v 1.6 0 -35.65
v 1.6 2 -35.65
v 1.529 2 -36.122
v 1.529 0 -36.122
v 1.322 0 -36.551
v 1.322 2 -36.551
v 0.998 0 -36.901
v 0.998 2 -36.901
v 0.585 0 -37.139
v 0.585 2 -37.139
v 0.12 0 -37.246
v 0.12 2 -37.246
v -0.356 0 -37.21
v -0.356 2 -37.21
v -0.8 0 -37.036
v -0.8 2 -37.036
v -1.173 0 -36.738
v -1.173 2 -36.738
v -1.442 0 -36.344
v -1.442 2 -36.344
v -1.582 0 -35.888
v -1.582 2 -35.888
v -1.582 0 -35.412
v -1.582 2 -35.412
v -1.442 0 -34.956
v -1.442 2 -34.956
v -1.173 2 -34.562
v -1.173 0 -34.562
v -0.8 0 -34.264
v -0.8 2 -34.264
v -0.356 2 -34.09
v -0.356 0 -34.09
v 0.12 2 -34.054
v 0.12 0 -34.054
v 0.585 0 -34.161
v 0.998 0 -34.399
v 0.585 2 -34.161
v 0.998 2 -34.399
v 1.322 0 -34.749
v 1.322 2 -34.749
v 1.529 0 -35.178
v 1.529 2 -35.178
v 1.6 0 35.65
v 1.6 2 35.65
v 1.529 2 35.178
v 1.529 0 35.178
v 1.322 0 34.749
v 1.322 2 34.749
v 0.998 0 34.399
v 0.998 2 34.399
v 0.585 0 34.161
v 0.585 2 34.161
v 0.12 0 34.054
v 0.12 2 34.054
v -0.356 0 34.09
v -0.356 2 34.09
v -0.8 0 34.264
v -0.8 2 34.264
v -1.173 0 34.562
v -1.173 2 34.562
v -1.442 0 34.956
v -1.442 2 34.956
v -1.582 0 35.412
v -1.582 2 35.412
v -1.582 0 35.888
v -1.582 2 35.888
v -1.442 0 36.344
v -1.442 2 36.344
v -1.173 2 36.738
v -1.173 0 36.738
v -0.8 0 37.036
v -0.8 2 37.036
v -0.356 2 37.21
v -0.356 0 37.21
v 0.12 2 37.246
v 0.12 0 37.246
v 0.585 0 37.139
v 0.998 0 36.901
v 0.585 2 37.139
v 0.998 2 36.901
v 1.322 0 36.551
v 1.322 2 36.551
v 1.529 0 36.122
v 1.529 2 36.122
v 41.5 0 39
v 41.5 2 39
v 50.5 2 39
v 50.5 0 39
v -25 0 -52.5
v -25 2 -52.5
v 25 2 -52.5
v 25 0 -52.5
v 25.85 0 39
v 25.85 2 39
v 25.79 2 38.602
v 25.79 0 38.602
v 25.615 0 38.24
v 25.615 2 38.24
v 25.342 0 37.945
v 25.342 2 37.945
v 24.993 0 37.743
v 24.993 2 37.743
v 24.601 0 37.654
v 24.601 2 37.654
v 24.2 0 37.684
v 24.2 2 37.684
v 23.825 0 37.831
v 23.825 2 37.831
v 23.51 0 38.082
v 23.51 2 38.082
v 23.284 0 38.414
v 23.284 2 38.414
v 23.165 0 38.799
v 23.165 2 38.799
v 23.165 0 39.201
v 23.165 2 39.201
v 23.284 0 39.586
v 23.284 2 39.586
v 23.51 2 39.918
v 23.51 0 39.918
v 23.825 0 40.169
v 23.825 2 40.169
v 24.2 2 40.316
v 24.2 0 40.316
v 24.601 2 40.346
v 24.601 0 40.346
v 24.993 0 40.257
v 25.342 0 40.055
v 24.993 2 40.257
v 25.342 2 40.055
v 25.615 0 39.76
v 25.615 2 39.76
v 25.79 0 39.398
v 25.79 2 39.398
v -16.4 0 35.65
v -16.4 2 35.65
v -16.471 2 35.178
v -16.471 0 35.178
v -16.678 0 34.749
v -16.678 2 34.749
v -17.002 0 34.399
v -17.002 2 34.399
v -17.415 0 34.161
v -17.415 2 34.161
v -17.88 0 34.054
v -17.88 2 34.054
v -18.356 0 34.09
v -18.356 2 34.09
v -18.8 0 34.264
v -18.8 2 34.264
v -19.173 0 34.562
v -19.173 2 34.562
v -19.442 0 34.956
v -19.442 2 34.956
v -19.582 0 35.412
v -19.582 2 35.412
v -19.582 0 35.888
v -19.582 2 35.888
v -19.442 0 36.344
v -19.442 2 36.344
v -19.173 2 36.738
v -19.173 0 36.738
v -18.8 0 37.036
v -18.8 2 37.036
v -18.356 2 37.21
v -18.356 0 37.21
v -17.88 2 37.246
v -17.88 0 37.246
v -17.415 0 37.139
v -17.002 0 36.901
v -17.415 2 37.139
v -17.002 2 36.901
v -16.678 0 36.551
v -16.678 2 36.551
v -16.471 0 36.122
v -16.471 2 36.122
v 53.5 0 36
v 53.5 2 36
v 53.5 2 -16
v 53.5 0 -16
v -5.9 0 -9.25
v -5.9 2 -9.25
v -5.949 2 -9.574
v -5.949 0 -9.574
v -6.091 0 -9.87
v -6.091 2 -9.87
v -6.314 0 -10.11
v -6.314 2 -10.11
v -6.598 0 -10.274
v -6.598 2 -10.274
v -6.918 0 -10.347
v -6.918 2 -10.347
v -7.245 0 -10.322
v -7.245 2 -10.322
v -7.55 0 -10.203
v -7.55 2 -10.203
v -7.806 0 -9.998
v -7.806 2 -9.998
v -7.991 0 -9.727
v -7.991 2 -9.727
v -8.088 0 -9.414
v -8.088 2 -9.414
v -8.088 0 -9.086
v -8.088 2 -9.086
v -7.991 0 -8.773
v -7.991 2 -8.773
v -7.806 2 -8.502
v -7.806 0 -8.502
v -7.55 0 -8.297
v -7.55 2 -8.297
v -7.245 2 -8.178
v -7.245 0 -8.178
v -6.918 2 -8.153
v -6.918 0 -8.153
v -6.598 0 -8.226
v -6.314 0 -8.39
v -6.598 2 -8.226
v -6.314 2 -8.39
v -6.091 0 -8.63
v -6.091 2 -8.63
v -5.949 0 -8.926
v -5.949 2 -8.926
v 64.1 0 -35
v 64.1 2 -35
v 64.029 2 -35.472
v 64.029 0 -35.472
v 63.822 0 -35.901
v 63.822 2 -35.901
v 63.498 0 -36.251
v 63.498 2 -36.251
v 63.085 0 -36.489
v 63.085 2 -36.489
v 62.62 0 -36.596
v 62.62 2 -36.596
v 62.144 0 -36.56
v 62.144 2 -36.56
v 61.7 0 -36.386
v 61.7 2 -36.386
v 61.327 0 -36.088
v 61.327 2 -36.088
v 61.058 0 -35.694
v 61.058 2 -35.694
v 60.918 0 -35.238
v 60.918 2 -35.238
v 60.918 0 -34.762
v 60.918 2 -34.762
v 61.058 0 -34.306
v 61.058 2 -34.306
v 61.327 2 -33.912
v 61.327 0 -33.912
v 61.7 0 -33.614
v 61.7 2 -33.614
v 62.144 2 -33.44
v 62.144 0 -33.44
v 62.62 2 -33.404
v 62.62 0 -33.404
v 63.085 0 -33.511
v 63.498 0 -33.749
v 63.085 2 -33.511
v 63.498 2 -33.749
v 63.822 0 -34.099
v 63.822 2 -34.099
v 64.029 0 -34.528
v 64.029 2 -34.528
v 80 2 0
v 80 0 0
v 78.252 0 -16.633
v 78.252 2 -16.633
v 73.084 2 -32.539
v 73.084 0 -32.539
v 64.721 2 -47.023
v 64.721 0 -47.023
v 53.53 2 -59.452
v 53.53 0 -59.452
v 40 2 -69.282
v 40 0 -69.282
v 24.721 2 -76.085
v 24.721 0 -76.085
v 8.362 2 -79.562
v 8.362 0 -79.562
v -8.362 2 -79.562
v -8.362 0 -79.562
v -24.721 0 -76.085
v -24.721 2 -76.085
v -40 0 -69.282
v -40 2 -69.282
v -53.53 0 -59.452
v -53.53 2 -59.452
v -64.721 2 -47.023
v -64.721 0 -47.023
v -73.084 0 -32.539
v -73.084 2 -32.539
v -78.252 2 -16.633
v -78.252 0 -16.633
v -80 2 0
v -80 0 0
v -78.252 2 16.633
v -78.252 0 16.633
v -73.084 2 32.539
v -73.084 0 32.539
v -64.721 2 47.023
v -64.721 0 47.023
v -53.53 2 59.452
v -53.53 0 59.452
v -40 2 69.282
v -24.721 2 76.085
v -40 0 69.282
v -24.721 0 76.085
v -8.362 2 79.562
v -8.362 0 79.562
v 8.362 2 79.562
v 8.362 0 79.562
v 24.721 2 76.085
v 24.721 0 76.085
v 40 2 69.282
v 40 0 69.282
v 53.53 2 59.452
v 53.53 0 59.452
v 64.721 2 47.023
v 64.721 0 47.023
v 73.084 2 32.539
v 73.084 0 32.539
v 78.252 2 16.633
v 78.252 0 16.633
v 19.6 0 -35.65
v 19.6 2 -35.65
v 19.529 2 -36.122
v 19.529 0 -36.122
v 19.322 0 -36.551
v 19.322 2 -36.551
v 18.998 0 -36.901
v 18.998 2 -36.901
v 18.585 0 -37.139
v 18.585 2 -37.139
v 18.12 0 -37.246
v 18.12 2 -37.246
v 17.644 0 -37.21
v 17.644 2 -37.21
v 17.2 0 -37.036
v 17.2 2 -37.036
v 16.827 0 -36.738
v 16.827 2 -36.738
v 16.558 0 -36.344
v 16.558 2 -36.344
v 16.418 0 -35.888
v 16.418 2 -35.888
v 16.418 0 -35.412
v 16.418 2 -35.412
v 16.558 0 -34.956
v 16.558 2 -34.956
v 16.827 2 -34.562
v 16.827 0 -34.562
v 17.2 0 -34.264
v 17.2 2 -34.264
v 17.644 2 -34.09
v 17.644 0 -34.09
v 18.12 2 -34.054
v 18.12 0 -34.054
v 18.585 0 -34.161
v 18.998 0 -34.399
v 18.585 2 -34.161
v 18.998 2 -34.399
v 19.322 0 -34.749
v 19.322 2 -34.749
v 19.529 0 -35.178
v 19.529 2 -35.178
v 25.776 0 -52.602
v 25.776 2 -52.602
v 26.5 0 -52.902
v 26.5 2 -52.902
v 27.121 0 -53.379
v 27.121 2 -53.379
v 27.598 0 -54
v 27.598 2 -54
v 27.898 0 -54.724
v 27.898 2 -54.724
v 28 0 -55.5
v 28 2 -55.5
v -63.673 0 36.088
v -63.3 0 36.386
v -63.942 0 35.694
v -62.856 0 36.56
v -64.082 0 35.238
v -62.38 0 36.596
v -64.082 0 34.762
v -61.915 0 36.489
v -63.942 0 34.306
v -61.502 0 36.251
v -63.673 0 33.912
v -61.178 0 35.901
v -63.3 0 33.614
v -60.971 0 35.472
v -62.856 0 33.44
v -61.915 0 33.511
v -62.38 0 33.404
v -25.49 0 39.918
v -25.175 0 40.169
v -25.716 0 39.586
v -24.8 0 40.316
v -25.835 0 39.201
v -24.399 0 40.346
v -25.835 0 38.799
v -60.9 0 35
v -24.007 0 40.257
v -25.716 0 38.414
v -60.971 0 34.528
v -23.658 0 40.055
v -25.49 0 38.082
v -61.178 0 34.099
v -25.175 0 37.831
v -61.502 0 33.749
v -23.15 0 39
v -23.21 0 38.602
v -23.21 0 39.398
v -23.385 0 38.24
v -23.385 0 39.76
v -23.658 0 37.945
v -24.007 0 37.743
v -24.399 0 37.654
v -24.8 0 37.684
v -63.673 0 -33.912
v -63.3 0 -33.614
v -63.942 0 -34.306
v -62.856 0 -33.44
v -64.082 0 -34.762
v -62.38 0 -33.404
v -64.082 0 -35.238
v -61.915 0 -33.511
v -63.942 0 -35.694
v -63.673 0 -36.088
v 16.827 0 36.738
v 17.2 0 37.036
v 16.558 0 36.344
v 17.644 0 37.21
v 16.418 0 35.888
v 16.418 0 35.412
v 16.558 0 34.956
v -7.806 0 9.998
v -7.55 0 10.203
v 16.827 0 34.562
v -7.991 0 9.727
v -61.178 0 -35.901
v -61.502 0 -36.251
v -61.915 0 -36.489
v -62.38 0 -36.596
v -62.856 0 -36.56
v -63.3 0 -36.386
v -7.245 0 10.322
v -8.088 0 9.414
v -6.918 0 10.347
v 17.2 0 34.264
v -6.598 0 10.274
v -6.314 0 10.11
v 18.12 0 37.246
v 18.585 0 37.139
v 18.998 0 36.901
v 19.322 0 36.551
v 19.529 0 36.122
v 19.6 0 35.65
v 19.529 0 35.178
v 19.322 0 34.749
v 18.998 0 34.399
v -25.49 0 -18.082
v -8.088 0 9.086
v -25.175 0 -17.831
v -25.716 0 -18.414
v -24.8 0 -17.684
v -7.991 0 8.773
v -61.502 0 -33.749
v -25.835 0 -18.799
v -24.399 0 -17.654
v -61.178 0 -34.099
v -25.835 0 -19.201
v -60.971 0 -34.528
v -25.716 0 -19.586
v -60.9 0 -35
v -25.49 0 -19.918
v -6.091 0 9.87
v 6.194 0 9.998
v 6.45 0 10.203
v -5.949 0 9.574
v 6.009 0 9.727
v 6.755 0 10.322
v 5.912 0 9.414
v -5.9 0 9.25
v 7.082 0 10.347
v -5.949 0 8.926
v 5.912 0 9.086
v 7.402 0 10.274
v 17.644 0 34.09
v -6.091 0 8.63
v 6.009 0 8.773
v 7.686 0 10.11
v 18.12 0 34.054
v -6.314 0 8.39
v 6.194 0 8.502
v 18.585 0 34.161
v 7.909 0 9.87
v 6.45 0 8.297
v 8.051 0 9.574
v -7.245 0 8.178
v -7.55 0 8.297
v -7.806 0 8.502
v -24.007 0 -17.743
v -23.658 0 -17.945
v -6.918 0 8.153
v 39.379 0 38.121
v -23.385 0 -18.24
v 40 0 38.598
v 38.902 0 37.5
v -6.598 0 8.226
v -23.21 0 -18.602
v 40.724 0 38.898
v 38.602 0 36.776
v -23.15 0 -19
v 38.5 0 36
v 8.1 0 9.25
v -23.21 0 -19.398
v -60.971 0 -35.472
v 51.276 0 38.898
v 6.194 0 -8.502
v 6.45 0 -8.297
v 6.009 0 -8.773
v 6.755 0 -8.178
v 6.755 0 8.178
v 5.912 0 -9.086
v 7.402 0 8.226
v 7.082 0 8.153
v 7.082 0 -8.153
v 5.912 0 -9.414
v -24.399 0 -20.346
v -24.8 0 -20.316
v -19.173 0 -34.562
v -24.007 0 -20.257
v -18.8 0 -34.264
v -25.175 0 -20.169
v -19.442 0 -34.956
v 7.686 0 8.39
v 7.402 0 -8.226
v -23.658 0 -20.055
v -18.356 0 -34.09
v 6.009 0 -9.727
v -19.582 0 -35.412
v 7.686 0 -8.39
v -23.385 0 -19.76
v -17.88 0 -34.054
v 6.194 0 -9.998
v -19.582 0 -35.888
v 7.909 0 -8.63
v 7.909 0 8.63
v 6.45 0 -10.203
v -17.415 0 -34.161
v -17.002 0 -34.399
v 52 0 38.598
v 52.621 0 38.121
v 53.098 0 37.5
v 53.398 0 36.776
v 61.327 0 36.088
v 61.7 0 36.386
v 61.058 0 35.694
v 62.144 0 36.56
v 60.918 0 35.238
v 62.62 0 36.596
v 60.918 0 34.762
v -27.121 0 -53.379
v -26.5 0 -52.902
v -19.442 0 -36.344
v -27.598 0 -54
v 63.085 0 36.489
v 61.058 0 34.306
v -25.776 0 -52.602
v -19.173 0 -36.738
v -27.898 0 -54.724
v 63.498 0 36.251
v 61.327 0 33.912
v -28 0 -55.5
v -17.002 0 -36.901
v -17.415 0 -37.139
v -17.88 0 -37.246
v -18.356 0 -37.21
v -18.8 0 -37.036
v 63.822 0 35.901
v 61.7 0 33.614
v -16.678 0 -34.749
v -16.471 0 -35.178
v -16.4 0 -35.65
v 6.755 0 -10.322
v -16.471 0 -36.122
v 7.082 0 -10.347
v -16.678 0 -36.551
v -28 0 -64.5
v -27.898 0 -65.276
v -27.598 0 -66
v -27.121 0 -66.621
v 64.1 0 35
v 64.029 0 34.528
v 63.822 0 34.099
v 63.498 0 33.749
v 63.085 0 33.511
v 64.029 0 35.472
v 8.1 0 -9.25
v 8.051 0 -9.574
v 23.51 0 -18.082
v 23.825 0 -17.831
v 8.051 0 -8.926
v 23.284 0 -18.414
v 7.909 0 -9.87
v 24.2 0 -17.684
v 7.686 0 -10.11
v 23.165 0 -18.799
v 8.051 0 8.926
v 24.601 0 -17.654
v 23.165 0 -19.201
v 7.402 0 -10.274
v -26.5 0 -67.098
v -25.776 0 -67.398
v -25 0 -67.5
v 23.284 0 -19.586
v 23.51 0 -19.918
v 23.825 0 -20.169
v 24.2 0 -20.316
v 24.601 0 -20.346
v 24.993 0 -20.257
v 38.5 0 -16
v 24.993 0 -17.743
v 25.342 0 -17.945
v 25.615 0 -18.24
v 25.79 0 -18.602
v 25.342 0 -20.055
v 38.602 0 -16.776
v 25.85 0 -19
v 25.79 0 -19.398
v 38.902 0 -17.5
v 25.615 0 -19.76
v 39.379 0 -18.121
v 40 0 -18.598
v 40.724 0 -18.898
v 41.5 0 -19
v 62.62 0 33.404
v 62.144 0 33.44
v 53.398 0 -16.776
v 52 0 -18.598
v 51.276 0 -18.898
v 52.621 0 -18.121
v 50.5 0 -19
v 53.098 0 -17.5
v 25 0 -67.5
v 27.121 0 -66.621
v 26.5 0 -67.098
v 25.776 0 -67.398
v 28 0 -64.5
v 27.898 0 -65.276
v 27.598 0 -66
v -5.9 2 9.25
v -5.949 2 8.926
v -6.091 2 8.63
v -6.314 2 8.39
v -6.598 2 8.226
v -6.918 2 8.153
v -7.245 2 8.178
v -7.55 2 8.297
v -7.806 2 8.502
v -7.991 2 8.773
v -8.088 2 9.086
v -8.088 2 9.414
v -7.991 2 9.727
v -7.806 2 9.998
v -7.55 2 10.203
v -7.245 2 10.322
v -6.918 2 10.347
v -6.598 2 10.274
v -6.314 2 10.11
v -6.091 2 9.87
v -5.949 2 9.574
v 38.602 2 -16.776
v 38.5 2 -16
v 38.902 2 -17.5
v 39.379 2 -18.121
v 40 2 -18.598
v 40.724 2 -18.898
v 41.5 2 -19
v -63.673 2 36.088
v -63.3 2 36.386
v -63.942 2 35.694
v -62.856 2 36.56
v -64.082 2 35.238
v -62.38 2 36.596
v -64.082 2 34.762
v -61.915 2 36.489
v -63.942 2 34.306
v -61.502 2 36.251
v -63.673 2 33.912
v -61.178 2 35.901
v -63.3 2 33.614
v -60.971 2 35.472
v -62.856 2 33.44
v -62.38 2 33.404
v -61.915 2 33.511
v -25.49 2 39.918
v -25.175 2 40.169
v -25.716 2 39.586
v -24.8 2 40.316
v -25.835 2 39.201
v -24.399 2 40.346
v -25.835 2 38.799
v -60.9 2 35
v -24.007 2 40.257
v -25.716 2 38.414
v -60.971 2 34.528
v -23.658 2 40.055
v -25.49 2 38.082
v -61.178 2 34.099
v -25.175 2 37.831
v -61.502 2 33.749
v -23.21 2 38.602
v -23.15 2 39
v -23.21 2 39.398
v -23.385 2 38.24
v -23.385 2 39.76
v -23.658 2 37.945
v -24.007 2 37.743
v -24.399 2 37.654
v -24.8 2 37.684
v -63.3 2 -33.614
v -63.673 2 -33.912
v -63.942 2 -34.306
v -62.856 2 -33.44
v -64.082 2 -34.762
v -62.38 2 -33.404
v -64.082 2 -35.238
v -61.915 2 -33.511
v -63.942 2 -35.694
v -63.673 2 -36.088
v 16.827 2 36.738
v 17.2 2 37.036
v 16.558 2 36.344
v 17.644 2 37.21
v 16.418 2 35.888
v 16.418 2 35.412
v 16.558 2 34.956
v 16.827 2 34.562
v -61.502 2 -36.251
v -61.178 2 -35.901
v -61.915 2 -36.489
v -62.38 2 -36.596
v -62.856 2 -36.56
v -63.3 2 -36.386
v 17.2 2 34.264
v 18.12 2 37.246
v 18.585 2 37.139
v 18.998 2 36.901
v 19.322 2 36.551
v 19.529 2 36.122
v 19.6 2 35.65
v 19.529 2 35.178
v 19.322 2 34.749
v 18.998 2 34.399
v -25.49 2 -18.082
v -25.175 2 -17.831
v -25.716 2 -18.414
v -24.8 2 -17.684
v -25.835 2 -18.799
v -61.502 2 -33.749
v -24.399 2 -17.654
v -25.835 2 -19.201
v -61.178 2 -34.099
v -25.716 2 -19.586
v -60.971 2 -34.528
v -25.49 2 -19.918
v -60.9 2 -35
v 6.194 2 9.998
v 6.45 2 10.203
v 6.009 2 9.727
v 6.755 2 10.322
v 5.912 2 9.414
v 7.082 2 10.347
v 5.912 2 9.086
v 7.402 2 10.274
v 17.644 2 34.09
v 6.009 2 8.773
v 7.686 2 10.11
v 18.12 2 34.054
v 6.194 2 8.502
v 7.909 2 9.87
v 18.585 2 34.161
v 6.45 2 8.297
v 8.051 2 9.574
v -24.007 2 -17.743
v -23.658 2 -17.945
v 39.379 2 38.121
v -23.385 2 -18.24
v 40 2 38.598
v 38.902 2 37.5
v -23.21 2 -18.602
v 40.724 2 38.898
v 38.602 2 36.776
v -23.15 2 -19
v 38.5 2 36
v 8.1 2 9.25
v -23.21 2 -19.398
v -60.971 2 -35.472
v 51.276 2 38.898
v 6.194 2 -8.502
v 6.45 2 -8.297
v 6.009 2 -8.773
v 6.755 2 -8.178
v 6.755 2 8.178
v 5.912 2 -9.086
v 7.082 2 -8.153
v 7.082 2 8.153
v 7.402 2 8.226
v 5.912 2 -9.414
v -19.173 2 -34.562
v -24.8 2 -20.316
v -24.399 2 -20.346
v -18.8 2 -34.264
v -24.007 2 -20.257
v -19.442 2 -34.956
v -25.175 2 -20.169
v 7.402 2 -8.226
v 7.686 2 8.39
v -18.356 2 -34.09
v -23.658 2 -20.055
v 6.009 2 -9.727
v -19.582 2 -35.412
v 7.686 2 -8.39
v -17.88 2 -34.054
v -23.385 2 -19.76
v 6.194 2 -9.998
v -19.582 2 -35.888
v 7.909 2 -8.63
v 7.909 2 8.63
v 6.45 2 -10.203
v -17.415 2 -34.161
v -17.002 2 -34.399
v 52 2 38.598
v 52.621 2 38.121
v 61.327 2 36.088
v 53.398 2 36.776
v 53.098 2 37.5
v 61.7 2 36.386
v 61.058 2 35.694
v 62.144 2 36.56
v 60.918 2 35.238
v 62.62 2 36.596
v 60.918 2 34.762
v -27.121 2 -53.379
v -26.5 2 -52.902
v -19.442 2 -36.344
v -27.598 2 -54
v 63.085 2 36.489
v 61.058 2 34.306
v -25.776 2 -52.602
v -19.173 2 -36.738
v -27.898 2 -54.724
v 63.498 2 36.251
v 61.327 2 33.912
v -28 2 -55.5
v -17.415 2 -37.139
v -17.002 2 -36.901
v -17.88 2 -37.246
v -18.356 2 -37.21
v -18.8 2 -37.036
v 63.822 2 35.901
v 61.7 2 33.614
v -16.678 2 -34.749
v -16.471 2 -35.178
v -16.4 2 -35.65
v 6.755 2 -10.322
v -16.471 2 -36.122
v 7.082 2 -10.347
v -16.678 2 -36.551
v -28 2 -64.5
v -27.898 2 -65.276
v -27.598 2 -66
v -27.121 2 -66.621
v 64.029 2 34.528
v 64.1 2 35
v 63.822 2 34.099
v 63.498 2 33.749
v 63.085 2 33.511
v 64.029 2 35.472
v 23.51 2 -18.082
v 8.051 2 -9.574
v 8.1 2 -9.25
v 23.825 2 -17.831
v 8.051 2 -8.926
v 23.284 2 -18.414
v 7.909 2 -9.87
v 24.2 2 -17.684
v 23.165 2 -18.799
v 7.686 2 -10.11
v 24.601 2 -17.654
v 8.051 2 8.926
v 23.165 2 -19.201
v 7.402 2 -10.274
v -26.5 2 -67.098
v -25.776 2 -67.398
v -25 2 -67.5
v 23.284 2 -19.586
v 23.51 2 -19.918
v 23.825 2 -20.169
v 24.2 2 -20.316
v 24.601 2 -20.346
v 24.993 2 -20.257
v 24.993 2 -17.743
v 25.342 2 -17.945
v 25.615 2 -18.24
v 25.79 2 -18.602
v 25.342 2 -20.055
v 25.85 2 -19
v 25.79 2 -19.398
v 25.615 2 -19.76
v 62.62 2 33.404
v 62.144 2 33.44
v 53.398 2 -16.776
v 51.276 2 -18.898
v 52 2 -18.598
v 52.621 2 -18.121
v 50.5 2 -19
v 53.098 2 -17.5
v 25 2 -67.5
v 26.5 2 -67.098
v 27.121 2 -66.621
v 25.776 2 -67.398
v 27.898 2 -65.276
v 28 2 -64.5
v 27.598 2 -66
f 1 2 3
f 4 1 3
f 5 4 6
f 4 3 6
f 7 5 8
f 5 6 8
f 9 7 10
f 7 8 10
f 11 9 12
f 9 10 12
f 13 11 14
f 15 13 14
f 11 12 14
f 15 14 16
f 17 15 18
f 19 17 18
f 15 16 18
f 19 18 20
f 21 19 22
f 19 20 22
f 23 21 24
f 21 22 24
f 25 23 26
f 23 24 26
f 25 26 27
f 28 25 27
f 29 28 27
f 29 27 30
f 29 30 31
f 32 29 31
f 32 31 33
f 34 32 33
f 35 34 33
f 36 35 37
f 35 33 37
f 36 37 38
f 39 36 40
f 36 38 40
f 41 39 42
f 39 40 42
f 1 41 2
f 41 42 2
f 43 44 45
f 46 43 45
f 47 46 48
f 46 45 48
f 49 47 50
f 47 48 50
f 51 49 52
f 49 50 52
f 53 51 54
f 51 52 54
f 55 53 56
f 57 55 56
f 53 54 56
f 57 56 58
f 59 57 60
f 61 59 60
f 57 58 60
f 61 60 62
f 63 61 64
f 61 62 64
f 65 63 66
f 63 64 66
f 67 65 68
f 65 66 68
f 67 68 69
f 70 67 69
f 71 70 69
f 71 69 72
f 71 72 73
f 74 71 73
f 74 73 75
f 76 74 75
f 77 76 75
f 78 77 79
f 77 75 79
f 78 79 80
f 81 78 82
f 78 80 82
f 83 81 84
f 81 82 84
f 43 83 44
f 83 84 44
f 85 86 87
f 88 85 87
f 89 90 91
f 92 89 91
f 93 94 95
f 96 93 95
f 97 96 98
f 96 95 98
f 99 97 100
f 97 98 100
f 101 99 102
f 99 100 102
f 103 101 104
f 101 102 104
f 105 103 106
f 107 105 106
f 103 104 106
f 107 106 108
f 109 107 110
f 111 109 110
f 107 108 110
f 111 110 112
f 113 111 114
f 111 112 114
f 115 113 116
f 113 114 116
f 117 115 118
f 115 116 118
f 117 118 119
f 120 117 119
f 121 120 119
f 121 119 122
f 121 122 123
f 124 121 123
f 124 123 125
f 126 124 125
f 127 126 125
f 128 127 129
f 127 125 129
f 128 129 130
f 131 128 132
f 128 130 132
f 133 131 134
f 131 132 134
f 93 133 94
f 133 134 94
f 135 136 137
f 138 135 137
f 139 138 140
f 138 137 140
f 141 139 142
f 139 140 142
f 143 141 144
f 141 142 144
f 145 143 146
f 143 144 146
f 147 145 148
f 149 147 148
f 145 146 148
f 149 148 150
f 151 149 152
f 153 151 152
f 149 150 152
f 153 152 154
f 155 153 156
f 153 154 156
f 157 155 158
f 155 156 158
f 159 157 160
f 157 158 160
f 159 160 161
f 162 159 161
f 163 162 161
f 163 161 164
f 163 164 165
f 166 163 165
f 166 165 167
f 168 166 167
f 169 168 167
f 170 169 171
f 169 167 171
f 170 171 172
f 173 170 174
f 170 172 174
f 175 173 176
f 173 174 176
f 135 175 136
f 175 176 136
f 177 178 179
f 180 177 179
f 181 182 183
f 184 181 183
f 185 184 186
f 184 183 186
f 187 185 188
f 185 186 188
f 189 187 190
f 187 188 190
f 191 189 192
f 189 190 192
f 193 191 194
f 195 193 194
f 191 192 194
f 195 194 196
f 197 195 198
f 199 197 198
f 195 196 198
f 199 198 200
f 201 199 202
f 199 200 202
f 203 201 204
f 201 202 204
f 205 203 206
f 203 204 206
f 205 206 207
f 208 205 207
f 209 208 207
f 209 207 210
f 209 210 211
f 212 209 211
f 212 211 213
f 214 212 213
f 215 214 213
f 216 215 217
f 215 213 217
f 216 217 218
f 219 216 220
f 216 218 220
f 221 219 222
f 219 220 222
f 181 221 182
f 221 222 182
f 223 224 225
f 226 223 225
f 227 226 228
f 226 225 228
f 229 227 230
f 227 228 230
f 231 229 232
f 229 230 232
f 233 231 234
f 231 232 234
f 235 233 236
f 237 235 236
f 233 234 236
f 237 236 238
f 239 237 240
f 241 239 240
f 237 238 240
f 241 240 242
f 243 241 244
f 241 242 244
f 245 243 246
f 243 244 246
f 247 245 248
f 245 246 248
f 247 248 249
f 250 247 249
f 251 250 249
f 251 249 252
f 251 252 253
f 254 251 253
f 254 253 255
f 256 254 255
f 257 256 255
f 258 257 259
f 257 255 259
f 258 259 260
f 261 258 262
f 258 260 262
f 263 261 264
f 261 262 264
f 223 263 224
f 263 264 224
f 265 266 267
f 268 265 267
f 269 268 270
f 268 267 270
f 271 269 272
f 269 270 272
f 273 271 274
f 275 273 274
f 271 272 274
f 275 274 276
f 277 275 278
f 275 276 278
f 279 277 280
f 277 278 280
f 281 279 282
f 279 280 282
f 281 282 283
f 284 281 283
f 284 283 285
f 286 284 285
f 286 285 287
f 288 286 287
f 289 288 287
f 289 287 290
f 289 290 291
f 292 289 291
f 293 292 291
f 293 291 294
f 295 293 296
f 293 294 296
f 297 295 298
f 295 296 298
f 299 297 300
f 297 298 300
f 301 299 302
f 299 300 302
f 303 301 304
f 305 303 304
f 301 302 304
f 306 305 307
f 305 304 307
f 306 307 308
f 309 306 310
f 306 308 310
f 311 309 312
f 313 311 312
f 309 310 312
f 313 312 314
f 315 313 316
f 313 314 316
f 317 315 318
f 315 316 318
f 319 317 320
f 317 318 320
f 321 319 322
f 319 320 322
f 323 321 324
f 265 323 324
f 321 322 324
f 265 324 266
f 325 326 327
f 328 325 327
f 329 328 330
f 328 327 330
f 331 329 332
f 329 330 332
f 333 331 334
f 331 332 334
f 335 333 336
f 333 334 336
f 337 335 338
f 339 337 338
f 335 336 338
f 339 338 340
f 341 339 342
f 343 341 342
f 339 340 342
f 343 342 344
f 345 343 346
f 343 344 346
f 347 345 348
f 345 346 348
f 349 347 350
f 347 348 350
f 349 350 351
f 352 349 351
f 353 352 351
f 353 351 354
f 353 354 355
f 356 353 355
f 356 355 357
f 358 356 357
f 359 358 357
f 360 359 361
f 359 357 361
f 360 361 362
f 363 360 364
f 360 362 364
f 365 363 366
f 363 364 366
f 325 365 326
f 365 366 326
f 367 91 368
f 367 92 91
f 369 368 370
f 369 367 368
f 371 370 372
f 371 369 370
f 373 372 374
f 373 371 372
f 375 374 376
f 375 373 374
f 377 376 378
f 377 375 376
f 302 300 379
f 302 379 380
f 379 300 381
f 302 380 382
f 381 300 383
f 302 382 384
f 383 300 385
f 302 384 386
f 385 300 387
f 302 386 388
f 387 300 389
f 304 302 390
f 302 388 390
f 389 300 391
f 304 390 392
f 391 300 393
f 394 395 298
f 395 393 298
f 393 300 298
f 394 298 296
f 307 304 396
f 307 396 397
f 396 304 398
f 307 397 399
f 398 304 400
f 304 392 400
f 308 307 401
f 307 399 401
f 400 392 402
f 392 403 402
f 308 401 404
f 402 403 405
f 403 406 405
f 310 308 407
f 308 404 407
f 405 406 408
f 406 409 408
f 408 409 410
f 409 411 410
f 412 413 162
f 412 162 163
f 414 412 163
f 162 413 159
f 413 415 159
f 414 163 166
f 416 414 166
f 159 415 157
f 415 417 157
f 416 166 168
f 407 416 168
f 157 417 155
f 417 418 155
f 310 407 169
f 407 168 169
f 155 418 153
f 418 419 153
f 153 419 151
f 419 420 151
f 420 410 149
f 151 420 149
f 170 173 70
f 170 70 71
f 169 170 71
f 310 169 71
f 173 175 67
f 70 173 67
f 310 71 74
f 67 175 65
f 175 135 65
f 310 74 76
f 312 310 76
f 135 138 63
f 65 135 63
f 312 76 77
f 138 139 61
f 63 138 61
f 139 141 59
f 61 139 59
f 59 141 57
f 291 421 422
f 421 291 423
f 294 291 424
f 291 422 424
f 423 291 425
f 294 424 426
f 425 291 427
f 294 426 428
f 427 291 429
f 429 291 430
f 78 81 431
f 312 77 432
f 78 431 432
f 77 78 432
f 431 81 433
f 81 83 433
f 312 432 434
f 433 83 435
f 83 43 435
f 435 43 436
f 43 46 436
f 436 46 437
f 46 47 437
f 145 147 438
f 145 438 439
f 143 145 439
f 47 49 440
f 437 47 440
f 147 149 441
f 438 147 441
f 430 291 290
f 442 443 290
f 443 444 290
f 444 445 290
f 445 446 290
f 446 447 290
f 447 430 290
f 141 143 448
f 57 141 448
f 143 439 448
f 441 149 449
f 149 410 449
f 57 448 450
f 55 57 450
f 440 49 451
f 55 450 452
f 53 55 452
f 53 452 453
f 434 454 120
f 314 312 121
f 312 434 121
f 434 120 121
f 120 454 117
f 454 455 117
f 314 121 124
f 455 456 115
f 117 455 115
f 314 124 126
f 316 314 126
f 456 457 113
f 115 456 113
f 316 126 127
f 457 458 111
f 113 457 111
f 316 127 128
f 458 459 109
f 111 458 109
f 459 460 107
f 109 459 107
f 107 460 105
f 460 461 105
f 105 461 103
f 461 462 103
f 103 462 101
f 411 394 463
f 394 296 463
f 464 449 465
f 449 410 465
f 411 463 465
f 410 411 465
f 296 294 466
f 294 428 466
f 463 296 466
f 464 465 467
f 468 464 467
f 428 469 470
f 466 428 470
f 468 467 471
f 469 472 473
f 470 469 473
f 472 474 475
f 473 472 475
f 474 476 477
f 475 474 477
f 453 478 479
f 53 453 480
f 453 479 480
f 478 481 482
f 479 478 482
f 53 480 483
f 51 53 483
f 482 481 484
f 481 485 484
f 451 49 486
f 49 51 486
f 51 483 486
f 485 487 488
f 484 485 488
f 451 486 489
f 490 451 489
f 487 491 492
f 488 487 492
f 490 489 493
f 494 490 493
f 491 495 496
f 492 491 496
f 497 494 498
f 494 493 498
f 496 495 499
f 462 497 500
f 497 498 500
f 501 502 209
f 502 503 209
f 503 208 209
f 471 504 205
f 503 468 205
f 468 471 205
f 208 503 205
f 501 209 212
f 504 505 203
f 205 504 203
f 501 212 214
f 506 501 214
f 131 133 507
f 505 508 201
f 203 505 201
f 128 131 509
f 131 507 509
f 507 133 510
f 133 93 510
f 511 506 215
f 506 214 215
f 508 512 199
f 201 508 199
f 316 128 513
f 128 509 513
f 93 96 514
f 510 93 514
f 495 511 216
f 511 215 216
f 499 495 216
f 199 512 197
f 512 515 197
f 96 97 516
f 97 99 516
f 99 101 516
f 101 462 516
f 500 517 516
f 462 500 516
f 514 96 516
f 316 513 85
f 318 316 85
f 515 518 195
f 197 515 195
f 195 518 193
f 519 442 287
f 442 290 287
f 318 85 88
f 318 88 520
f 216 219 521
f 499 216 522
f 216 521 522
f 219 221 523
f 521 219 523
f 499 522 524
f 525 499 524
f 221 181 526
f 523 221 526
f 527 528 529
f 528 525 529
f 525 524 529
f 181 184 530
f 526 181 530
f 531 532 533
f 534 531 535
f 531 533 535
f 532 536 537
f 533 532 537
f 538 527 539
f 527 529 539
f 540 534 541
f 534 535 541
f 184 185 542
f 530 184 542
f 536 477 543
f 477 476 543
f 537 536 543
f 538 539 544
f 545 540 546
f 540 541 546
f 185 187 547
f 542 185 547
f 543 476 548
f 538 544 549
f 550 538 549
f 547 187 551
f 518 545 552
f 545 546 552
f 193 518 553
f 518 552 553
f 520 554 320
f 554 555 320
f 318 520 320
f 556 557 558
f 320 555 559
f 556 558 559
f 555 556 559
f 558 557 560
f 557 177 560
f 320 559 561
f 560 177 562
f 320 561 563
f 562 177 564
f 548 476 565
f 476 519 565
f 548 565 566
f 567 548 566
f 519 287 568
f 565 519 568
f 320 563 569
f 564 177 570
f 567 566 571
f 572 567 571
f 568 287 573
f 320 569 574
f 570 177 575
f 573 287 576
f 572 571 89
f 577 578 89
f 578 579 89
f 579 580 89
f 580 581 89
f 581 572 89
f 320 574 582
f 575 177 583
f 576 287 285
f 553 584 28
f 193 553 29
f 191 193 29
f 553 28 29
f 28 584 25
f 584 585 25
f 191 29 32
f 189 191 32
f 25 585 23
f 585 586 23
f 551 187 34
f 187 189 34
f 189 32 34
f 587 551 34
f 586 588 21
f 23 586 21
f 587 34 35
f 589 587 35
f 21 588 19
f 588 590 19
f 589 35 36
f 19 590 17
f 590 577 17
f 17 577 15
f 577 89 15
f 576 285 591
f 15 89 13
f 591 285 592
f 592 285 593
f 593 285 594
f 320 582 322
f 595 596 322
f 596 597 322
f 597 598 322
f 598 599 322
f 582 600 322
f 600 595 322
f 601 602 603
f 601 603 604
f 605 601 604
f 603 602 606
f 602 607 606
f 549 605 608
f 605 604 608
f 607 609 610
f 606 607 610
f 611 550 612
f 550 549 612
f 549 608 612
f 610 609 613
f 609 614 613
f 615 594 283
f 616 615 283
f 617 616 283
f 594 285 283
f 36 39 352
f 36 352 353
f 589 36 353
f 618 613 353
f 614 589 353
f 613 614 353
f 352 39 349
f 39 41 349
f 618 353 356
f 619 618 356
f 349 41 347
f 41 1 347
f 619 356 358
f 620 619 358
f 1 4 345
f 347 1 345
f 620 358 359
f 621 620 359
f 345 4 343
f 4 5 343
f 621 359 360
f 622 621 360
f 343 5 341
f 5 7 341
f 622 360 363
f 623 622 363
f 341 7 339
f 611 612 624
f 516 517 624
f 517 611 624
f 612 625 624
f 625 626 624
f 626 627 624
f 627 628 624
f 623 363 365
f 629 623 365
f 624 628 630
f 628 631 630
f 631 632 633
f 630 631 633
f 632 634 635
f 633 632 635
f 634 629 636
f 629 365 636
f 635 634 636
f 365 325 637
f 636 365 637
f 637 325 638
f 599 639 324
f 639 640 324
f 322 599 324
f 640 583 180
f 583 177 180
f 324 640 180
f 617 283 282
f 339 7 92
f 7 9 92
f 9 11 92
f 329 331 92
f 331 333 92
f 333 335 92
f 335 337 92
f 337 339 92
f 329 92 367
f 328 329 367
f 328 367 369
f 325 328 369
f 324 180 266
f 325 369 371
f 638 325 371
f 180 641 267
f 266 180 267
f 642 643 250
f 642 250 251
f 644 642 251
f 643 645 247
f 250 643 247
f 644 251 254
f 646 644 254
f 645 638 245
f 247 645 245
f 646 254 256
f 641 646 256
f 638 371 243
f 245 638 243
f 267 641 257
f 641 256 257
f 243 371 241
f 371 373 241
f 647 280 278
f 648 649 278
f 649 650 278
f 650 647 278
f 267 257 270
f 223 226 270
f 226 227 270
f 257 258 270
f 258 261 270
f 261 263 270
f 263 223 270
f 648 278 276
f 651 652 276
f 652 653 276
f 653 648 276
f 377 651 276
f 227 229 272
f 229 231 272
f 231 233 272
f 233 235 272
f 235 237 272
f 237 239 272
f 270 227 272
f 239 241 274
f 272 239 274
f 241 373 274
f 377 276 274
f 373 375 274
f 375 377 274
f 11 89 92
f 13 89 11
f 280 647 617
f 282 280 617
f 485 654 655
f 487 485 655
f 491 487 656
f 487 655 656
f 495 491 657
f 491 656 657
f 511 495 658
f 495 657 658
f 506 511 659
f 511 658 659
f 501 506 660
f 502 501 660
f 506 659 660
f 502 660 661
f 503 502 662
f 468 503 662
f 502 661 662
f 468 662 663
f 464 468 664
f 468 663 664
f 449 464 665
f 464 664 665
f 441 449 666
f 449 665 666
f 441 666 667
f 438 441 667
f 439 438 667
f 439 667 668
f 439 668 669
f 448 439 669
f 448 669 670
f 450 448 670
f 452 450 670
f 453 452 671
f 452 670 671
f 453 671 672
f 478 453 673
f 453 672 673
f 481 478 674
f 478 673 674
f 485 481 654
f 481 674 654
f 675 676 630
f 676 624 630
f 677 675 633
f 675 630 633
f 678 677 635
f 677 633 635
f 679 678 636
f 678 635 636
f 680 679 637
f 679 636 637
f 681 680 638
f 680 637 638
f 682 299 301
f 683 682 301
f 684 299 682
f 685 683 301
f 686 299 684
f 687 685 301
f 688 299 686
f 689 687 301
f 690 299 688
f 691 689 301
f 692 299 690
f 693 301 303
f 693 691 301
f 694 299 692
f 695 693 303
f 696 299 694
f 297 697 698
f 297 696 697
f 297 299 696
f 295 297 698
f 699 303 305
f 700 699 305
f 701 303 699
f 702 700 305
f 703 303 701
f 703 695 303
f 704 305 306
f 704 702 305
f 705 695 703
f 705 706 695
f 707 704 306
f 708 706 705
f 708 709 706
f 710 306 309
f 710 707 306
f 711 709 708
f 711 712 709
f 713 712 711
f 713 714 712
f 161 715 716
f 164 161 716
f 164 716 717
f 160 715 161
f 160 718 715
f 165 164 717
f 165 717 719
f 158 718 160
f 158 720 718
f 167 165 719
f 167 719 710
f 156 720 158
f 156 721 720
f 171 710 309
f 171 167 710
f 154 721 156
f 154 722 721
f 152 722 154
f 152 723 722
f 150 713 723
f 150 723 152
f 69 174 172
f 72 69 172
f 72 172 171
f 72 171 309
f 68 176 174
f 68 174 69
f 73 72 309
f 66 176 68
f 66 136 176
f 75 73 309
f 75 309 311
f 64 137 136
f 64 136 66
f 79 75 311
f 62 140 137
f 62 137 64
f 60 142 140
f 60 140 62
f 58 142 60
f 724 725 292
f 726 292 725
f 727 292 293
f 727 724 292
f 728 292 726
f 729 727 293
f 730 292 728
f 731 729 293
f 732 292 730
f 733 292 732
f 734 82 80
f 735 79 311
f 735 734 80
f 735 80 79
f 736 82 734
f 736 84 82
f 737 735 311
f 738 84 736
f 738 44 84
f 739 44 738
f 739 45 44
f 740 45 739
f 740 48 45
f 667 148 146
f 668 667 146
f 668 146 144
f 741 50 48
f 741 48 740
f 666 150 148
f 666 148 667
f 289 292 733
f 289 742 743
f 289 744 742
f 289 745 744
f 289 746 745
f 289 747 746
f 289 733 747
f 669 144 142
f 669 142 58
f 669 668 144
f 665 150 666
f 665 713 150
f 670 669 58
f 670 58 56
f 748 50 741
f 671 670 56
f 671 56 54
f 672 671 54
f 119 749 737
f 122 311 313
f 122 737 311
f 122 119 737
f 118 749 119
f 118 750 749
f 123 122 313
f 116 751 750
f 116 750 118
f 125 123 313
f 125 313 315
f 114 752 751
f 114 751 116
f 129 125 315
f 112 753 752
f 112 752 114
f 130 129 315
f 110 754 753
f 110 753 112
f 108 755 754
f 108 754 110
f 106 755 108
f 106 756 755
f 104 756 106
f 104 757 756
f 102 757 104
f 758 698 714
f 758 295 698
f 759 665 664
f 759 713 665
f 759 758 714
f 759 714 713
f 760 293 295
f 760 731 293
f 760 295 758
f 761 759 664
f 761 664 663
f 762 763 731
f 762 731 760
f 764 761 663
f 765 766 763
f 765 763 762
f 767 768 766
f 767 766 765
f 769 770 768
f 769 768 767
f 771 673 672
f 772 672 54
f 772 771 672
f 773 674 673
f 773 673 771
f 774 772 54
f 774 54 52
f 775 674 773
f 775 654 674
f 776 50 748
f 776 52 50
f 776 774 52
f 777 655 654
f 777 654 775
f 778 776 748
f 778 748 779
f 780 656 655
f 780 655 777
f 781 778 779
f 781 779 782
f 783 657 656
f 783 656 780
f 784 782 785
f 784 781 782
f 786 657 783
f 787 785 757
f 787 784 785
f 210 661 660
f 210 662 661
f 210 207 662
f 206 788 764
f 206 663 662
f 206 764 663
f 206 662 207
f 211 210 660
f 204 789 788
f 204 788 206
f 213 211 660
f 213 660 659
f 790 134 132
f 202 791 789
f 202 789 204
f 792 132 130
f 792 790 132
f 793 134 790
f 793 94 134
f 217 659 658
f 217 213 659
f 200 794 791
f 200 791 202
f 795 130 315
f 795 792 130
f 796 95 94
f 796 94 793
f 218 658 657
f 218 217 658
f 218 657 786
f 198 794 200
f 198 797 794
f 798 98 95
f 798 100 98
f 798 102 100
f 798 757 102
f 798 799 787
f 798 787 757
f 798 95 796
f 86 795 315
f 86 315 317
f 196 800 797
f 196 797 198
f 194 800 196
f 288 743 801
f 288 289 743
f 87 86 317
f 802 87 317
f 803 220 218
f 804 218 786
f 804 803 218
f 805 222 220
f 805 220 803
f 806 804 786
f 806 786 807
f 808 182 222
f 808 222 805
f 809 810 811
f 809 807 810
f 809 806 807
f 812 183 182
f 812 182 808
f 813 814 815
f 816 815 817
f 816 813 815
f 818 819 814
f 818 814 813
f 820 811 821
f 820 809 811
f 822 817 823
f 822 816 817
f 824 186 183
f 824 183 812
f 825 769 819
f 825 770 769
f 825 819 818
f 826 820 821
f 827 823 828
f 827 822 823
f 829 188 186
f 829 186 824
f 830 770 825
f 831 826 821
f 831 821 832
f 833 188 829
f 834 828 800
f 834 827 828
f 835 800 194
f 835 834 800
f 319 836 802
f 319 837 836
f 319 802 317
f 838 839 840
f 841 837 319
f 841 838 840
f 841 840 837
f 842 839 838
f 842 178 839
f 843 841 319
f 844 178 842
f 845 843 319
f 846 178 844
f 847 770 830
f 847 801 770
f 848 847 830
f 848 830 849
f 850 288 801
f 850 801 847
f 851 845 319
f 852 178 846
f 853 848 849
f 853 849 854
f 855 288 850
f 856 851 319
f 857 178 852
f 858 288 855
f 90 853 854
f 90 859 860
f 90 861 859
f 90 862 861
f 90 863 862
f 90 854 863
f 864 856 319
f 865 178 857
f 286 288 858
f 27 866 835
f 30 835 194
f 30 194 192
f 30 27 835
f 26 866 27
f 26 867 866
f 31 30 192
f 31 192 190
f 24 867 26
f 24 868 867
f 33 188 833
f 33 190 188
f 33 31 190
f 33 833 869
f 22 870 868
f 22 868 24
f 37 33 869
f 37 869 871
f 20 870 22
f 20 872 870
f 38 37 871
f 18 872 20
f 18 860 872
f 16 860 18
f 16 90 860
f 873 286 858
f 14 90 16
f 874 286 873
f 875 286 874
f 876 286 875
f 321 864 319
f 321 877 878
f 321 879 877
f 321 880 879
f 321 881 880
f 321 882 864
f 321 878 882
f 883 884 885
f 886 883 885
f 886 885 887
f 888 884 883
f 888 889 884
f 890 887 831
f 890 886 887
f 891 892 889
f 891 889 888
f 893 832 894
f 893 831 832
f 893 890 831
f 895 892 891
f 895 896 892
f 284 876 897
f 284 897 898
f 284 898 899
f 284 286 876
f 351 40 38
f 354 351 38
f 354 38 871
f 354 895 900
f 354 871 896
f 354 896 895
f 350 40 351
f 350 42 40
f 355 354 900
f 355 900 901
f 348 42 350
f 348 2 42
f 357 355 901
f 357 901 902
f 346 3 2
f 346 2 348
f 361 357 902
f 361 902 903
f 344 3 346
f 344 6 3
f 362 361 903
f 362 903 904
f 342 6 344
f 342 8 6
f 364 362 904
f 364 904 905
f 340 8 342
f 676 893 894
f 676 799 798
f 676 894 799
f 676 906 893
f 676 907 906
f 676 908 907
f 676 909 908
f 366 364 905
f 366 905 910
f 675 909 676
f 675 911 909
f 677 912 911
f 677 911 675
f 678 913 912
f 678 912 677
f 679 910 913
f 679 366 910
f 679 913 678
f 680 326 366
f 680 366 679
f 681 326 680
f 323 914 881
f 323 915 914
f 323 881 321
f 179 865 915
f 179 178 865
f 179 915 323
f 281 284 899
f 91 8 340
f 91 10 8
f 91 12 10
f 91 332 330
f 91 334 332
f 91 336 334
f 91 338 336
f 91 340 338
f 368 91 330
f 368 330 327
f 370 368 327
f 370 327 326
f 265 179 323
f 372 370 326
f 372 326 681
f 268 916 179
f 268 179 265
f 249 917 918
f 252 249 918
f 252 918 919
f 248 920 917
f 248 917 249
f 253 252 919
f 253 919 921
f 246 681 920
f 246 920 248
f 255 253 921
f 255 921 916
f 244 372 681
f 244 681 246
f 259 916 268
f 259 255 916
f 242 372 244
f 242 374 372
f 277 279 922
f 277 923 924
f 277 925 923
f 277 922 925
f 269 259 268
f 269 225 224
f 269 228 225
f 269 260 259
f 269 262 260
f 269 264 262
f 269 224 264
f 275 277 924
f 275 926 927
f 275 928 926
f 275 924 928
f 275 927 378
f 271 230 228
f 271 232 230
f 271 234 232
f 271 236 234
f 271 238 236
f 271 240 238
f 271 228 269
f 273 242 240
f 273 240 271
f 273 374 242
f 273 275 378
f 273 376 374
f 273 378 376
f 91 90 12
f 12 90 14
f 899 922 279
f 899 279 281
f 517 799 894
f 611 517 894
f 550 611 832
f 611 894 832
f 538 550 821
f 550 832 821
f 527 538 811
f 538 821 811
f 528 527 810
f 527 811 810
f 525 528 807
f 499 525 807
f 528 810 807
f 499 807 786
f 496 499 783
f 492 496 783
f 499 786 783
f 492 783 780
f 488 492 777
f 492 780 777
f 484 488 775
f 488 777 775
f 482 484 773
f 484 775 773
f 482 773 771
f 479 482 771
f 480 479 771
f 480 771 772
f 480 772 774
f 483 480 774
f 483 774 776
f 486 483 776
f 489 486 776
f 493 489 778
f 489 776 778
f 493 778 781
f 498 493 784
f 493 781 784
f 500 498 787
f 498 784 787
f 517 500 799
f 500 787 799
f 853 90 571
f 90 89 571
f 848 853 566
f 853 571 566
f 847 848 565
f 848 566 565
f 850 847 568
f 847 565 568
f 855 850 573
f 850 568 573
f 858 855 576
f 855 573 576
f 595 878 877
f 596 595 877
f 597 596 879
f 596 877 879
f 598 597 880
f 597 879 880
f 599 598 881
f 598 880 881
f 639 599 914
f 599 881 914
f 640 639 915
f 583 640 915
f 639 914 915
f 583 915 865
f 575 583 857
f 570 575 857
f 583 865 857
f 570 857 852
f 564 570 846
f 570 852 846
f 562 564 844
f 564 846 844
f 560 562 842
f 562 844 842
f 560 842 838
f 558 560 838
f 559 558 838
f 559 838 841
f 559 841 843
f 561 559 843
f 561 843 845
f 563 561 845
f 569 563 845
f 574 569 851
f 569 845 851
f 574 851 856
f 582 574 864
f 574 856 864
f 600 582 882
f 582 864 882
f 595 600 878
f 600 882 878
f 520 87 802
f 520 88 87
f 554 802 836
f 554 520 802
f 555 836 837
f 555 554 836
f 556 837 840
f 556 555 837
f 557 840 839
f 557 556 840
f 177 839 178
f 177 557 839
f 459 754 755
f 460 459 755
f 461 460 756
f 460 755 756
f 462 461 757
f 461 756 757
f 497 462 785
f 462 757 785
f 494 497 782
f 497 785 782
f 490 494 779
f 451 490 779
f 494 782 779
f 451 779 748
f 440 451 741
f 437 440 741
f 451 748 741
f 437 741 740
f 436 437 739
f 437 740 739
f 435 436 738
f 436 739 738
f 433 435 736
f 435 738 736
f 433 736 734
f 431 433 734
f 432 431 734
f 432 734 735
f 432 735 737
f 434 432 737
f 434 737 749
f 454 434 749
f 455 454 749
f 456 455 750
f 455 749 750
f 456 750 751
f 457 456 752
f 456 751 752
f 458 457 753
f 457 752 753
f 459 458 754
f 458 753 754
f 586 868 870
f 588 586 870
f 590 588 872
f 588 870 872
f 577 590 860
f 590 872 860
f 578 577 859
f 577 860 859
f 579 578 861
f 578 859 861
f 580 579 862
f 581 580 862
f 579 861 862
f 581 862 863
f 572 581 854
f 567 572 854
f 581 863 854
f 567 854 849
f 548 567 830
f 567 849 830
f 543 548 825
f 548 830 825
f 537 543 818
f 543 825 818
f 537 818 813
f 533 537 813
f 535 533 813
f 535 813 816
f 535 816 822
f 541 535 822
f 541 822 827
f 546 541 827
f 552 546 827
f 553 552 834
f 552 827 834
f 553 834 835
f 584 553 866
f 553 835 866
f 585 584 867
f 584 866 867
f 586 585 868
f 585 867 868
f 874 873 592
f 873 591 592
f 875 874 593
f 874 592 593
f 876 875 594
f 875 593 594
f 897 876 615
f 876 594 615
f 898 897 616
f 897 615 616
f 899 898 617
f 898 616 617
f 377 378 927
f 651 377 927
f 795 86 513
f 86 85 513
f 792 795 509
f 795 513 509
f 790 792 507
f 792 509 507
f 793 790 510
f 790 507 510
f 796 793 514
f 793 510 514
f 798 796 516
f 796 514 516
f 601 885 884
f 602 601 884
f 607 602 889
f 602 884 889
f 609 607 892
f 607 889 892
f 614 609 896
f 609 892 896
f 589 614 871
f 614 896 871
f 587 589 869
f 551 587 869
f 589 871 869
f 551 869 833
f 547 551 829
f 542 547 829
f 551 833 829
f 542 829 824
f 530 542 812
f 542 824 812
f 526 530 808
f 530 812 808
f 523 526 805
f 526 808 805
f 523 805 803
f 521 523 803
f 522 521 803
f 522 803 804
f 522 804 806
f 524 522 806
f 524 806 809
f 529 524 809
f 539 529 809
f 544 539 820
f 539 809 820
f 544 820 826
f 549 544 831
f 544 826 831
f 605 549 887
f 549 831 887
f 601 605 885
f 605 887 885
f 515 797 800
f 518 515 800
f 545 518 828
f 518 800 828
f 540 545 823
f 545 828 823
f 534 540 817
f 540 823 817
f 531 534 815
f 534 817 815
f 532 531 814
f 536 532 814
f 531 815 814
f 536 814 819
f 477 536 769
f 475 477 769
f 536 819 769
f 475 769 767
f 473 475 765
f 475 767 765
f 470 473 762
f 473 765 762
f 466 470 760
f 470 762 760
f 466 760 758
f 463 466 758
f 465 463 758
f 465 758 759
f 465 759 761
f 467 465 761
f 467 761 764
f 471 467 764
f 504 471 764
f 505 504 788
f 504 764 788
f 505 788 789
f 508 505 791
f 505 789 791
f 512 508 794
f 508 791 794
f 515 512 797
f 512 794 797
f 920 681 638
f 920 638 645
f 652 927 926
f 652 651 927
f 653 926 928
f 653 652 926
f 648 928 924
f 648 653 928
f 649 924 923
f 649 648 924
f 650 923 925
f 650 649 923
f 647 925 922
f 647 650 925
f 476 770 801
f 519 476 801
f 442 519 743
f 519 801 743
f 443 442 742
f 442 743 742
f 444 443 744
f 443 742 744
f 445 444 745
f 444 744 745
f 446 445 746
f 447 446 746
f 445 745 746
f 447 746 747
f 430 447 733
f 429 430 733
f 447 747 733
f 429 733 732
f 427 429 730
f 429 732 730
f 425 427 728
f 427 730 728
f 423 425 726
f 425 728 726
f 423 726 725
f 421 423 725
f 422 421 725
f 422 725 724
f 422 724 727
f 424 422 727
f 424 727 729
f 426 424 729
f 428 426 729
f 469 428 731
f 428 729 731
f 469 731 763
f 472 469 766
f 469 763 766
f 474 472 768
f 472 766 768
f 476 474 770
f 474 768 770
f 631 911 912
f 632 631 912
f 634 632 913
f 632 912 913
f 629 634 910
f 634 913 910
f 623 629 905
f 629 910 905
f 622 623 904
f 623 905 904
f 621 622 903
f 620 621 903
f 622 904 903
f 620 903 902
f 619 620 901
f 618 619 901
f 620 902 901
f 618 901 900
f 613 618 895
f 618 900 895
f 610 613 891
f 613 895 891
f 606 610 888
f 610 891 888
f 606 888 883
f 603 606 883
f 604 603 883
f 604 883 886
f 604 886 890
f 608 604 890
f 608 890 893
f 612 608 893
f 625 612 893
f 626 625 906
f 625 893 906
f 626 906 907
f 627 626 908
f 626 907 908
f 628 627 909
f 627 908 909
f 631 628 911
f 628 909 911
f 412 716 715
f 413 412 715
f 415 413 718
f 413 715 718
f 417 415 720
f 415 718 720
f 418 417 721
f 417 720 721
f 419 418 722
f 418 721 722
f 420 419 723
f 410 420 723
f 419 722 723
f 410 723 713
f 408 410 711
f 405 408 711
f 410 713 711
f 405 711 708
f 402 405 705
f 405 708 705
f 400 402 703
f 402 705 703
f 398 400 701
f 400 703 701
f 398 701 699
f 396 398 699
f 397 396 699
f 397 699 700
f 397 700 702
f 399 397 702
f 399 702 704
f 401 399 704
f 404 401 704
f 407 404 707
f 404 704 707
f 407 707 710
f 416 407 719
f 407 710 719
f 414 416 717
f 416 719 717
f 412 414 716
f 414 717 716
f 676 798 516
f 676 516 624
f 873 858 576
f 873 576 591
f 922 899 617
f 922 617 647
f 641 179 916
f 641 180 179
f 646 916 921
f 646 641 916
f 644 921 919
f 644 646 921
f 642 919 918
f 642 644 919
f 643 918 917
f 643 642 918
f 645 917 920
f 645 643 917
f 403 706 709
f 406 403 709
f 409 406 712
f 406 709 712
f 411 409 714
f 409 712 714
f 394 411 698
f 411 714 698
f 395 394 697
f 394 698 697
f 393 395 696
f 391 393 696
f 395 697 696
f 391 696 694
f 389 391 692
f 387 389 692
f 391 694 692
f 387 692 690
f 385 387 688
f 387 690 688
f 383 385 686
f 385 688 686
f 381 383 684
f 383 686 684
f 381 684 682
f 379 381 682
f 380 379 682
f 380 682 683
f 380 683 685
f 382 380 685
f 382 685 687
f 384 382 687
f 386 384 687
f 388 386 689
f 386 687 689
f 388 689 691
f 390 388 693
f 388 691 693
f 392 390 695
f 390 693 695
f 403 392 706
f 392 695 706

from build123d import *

# Parameters (mm, degrees)
SKETCH_1_R             = 80
EXTRUDE_1_DEPTH        = 2
SKETCH_2_R             = 1.6
CUT_EXTRUDE_445_DEPTH  = 2
SKETCH_3_R             = 1.35
SKETCH_3_W             = 56
SKETCH_3_H             = 15
SKETCH_3_W_2           = 15
SKETCH_3_H_2           = 58
CUT_EXTRUDE_949_DEPTH  = 2
SKETCH_4_R             = 1.6
CUT_EXTRUDE_1375_DEPTH = 2
SKETCH_5_R             = 1.1
CUT_EXTRUDE_1819_DEPTH = 2
FILLET_2_R             = 3


with BuildPart() as part:
    # 草图1 → 凸台-拉伸1 (new body)
    with BuildSketch(Plane(origin=(0, 0, 0), x_dir=(1, 0, 0), z_dir=(0, 1, 0))):
        Circle(SKETCH_1_R)
    extrude(amount=EXTRUDE_1_DEPTH)

    # 草图2 → Cut-Extrude 445 (cut)
    with BuildSketch(Plane(origin=(0, 2, 0), x_dir=(1, 0, 0), z_dir=(0, 1, 0))):
        with Locations((-62.5, 35)):
            Circle(SKETCH_2_R)
        with Locations((-62.5, -35)):
            Circle(SKETCH_2_R)
        with Locations((62.5, -35)):
            Circle(SKETCH_2_R)
        with Locations((62.5, 35)):
            Circle(SKETCH_2_R)
    extrude(amount=-CUT_EXTRUDE_445_DEPTH, mode=Mode.SUBTRACT)

    # 草图3 → Cut-Extrude 949 (cut)
    with BuildSketch(Plane(origin=(0, 2, 0), x_dir=(1, 0, 0), z_dir=(0, 1, 0))):
        with Locations((-24.5, 19)):
            Circle(SKETCH_3_R)
        with Locations((-24.5, -39)):
            Circle(SKETCH_3_R)
        with Locations((24.5, -39)):
            Circle(SKETCH_3_R)
        with Locations((24.5, 19)):
            Circle(SKETCH_3_R)
        with Locations((0, 60)):
            Rectangle(SKETCH_3_W, SKETCH_3_H)
        with Locations((46, -10)):
            Rectangle(SKETCH_3_W_2, SKETCH_3_H_2)
    extrude(amount=-CUT_EXTRUDE_949_DEPTH, mode=Mode.SUBTRACT)

    # 草图4 → Cut-Extrude 1375 (cut)
    with BuildSketch(Plane(origin=(0, 2, 0), x_dir=(1, 0, 0), z_dir=(0, 1, 0))):
        with Locations((-18, 35.65)):
            Circle(SKETCH_4_R)
        with Locations((0, 35.65)):
            Circle(SKETCH_4_R)
        with Locations((18, 35.65)):
            Circle(SKETCH_4_R)
        with Locations((18, -35.65)):
            Circle(SKETCH_4_R)
        with Locations((0, -35.65)):
            Circle(SKETCH_4_R)
        with Locations((-18, -35.65)):
            Circle(SKETCH_4_R)
    extrude(amount=-CUT_EXTRUDE_1375_DEPTH, mode=Mode.SUBTRACT)

    # 草图5 → Cut-Extrude 1819 (cut)
    with BuildSketch(Plane(origin=(0, 2, 0), x_dir=(1, 0, 0), z_dir=(0, 1, 0))):
        with Locations((-7, 9.25)):
            Circle(SKETCH_5_R)
        with Locations((7, 9.25)):
            Circle(SKETCH_5_R)
        with Locations((7, -9.25)):
            Circle(SKETCH_5_R)
        with Locations((-7, -9.25)):
            Circle(SKETCH_5_R)
    extrude(amount=-CUT_EXTRUDE_1819_DEPTH, mode=Mode.SUBTRACT)

    # 圆角2
    fillet_2_edges = [part.edges().sort_by_distance(p)[0] for p in [
        (38.5, 1, 39),
        (38.5, 1, -19),
        (53.5, 1, -19),
        (53.5, 1, 39),
        (-28, 1, -52.5),
        (-28, 1, -67.5),
        (28, 1, -67.5),
        (28, 1, -52.5),
    ]]
    fillet(fillet_2_edges, radius=FILLET_2_R)


solid = part.part
